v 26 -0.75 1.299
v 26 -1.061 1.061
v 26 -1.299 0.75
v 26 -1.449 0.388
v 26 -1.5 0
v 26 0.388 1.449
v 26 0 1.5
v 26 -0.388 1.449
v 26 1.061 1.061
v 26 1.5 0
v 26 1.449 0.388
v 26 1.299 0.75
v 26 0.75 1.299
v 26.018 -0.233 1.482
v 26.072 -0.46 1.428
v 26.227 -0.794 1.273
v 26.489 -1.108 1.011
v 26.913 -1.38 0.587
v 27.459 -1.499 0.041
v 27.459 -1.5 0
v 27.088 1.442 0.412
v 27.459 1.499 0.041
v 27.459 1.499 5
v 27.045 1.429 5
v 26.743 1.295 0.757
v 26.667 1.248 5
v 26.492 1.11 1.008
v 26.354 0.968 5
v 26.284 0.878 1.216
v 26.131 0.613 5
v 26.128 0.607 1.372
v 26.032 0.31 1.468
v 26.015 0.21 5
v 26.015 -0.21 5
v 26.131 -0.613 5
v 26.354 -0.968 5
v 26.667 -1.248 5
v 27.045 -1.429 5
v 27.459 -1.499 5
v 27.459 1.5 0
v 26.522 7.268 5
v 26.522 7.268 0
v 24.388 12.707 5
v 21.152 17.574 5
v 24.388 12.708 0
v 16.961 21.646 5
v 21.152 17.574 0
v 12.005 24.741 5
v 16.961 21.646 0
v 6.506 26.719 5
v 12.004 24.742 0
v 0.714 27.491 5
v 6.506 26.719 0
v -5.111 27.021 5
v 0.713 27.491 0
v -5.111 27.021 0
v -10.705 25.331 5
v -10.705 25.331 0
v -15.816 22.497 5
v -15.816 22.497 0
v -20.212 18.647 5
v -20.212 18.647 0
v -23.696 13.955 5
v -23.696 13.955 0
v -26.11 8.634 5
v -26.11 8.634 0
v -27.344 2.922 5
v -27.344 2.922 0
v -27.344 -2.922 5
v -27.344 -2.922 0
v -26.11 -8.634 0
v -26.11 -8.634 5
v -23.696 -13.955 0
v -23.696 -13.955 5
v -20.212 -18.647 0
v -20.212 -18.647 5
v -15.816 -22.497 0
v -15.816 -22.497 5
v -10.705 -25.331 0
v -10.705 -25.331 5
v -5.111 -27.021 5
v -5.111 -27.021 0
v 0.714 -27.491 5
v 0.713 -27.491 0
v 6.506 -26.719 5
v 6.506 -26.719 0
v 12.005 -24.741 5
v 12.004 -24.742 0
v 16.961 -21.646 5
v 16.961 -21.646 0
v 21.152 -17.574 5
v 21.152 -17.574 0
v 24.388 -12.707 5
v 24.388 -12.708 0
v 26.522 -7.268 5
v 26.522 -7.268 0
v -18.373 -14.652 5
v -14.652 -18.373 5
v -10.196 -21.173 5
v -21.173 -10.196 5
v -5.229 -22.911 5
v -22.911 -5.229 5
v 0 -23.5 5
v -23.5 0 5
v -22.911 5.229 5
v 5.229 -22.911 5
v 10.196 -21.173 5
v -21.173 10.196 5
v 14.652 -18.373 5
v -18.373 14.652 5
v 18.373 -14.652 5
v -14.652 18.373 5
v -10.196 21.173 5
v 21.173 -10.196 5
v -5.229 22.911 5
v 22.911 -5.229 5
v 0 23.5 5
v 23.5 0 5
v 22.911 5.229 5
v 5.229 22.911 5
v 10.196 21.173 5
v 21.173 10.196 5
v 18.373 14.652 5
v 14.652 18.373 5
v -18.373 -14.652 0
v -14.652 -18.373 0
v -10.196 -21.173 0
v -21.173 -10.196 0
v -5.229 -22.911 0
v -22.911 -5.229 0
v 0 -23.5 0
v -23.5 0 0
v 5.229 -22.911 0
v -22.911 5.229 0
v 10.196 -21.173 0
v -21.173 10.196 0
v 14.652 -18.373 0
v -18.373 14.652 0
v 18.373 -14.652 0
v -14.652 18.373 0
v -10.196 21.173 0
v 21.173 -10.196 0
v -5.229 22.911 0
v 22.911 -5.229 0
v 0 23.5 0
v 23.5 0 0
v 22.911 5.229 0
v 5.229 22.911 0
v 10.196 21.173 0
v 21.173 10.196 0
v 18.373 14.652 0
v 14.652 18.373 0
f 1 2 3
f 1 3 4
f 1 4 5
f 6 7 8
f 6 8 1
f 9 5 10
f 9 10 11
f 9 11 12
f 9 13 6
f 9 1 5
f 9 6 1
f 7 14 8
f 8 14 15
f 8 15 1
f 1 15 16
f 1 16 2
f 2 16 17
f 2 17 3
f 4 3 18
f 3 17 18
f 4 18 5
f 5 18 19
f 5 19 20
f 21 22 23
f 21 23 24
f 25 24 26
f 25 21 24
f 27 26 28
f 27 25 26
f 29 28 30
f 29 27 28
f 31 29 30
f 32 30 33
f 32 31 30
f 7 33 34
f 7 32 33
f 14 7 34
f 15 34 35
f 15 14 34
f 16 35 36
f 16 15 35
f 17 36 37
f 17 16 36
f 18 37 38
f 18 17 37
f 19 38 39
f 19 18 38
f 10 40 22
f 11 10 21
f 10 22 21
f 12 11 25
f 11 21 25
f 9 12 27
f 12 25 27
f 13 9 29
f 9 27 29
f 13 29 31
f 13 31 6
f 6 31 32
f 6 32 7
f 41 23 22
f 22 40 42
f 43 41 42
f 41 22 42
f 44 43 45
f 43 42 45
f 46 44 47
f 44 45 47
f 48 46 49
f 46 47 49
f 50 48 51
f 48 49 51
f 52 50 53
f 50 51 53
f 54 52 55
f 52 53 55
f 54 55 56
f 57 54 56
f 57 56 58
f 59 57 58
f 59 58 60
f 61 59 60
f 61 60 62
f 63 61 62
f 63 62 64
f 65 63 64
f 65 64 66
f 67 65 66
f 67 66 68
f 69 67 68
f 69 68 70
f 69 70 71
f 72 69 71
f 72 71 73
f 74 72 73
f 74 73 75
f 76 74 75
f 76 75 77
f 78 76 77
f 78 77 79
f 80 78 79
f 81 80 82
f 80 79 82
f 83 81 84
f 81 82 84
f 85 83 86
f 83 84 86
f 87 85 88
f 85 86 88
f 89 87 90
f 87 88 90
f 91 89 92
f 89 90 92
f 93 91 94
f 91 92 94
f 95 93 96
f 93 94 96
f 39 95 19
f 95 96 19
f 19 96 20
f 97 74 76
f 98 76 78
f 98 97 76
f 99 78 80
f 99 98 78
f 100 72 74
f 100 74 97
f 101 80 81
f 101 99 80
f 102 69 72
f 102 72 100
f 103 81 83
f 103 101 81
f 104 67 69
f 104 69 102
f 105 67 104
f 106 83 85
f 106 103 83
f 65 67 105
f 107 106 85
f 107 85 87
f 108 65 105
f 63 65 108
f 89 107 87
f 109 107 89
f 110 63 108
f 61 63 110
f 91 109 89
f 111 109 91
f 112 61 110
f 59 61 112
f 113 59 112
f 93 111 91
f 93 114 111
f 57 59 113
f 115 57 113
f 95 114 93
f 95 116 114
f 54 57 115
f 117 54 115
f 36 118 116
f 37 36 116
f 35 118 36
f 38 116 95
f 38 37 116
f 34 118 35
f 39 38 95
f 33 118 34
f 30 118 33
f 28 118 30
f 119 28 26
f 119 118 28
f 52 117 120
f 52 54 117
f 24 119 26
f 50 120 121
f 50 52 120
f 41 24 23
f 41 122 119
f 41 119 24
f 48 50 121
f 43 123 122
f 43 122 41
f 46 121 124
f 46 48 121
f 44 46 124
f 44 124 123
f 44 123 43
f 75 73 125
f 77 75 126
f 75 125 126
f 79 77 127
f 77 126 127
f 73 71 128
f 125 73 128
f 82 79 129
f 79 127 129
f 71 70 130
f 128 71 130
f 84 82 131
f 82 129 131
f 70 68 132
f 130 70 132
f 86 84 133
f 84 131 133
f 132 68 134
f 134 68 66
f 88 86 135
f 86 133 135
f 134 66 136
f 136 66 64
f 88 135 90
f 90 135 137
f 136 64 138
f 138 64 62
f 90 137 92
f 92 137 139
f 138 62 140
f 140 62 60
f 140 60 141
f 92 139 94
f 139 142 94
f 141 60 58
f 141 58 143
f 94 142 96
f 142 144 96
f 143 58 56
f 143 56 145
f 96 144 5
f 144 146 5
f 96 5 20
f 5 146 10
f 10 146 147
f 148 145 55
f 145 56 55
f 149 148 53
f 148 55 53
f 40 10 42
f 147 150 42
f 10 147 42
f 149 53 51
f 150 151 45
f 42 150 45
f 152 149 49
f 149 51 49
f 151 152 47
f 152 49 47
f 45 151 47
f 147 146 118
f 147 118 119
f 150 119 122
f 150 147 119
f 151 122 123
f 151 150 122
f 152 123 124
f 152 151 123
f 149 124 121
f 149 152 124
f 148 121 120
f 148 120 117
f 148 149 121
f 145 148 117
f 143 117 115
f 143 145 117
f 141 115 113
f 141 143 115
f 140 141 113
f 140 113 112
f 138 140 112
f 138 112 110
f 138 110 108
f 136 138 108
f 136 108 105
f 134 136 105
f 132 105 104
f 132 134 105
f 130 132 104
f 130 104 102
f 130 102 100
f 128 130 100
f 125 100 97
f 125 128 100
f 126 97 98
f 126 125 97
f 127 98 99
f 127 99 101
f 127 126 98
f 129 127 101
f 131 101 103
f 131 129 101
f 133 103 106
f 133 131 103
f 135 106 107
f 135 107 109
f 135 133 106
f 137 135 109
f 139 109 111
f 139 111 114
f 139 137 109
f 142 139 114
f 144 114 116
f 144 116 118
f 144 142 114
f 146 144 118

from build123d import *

# Parameters (mm, degrees)
SKETCH_R        = 27.5
SKETCH_R_2      = 23.5
PAD_DEPTH       = 5
SKETCH001_R     = 1.5
POCKET_DEPTH    = 10
SKETCH002_R     = 1.5
POCKET001_DEPTH = 1.5


with BuildPart() as part:
    # Sketch → Pad (new body)
    with BuildSketch(Plane.XY):
        Circle(SKETCH_R)
        Circle(SKETCH_R_2, mode=Mode.SUBTRACT)
    extrude(amount=PAD_DEPTH)

    # Sketch001 → Pocket (cut)
    with BuildSketch(Plane(origin=(27.5, 0, 0), x_dir=(1, 0, 0), z_dir=(0, 0, 1))):
        Circle(SKETCH001_R)
    extrude(amount=POCKET_DEPTH, mode=Mode.SUBTRACT)

    # Sketch002 → Pocket001 (cut)
    with BuildSketch(Plane.YZ.offset(27.5)):
        Circle(SKETCH002_R)
    extrude(amount=-POCKET001_DEPTH, mode=Mode.SUBTRACT)


solid = part.part
